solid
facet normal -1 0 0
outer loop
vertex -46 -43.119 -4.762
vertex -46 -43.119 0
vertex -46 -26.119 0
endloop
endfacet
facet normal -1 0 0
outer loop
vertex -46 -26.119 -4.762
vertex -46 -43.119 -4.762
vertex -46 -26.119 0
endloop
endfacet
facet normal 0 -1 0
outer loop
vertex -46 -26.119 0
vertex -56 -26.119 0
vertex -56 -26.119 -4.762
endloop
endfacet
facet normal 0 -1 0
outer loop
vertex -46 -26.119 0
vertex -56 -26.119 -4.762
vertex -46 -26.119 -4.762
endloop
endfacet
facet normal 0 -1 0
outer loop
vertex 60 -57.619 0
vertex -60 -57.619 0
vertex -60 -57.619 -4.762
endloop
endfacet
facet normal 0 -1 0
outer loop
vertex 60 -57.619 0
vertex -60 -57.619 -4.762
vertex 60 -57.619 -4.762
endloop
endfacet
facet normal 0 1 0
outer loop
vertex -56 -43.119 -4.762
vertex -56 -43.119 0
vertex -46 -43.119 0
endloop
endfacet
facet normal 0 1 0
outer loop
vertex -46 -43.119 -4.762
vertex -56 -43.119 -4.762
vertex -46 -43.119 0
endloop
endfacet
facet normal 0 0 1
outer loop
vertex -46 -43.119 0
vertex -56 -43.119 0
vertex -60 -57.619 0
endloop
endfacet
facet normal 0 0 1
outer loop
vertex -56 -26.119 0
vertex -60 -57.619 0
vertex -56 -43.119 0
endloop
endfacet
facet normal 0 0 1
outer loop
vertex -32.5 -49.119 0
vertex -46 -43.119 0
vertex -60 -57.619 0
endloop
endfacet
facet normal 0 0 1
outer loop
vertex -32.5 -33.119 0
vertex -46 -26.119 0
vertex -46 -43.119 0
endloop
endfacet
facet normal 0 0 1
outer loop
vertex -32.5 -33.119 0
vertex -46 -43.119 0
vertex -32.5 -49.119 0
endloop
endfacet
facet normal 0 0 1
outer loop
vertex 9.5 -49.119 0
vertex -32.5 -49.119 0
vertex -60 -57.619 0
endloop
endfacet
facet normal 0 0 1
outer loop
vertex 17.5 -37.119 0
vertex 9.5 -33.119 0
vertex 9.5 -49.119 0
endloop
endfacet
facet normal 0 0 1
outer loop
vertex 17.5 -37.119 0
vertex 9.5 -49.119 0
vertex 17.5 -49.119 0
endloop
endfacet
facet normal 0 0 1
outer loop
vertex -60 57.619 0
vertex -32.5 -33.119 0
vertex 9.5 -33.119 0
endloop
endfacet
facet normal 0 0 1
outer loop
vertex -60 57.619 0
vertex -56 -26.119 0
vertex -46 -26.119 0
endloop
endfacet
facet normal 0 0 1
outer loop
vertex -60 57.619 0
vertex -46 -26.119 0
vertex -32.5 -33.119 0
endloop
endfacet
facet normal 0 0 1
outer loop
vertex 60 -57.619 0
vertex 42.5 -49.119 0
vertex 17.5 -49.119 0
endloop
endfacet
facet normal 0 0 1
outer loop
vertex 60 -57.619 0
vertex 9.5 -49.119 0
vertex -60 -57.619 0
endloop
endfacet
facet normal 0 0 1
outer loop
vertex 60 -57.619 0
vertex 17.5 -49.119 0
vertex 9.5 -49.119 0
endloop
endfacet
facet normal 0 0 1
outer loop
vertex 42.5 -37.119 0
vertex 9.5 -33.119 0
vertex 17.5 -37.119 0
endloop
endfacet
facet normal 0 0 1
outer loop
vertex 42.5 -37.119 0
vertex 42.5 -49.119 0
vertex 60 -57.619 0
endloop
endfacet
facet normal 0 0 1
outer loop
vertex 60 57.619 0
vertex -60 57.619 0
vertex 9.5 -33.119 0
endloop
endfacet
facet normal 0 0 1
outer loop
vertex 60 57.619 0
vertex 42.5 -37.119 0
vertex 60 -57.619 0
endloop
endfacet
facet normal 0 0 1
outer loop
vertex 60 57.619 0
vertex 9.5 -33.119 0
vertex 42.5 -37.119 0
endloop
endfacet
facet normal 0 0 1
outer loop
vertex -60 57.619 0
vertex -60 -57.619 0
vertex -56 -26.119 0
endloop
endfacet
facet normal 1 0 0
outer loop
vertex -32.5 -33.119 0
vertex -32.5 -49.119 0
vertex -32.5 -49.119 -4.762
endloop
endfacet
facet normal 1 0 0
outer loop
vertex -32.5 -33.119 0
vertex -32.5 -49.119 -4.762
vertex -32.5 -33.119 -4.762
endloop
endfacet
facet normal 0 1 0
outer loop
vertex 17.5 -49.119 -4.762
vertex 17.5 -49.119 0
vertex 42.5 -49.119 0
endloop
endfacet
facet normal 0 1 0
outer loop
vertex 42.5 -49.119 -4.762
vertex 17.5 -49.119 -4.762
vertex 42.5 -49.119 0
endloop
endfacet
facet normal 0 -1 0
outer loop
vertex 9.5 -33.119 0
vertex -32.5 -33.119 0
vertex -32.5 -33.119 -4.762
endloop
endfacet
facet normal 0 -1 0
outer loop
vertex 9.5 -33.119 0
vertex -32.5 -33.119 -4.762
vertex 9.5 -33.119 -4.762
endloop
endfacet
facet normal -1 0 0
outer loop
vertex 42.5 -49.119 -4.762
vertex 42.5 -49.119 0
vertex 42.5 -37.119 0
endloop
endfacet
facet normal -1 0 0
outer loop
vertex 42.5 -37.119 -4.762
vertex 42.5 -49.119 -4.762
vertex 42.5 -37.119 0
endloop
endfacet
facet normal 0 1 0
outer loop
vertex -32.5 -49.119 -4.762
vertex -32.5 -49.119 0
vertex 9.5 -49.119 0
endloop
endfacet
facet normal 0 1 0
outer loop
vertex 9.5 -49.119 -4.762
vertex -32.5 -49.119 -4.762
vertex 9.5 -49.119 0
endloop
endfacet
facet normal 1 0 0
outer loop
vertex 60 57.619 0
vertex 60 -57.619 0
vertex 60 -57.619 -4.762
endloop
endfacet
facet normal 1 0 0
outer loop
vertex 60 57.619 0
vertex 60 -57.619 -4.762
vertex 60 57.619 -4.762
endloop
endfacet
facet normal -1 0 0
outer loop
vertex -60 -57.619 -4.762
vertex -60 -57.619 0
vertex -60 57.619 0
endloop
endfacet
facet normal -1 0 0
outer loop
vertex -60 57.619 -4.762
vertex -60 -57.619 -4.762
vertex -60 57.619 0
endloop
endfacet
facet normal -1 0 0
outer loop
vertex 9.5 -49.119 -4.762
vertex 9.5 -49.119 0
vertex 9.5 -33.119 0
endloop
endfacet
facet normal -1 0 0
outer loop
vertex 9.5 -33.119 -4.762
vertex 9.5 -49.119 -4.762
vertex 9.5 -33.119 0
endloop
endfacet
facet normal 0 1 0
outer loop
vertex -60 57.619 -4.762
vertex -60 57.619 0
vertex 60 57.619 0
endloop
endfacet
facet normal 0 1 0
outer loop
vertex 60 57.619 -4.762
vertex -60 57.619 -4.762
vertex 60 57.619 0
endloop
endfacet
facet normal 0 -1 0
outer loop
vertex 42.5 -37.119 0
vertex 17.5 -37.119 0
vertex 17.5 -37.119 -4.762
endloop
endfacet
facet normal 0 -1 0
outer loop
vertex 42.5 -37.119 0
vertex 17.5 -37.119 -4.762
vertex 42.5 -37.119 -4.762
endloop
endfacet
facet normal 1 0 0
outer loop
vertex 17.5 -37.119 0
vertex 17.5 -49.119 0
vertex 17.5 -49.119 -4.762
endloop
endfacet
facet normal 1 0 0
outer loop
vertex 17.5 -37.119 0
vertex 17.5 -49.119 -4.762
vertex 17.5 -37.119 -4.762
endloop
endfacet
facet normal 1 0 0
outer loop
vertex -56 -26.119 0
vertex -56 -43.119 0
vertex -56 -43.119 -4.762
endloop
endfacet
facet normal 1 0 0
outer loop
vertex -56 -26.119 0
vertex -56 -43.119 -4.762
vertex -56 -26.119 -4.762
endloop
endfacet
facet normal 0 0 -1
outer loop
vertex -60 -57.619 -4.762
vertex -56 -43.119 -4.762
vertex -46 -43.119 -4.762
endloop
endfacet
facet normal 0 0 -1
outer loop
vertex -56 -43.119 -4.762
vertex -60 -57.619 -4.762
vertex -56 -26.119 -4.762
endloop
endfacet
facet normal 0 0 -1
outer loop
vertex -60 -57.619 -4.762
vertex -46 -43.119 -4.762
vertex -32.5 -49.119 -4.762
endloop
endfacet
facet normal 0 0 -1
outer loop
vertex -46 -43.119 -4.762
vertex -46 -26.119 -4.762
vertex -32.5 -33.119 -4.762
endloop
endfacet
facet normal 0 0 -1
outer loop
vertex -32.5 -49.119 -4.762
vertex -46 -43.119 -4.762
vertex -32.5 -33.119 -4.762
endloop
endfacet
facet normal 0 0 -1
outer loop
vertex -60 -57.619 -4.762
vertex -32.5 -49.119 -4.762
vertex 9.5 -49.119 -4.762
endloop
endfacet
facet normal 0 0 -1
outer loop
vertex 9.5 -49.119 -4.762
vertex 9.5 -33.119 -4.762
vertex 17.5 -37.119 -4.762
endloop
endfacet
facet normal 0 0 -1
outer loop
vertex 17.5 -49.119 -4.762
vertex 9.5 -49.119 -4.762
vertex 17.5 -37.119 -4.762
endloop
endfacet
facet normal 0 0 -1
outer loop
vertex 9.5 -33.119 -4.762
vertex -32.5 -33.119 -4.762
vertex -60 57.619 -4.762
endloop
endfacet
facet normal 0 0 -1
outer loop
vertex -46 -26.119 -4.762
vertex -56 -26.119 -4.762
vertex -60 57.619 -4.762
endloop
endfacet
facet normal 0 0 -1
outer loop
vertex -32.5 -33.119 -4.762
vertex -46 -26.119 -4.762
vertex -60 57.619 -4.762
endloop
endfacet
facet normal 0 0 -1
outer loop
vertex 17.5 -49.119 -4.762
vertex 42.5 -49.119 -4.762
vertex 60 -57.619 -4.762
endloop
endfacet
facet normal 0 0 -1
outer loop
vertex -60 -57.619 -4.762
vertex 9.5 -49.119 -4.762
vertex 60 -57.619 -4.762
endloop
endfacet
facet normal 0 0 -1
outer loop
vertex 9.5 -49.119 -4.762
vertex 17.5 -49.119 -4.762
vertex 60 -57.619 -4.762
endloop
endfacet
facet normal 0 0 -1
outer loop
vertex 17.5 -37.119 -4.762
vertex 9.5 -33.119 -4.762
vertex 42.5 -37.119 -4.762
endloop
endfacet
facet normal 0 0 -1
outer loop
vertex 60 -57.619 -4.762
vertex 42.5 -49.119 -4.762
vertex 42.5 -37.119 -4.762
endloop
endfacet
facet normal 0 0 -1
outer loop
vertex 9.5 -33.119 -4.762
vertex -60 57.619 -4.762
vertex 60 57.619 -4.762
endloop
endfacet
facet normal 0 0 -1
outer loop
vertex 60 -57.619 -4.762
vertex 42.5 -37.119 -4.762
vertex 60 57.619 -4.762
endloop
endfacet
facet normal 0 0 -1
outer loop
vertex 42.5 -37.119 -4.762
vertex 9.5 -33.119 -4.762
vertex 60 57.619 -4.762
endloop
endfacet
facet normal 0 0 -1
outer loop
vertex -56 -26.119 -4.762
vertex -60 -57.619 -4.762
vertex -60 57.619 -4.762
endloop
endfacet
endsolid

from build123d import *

# Parameters (mm, degrees)
SKETCH1_W           = 120
SKETCH1_H           = 115.2375
BOSS_EXTRUDE1_DEPTH = 4.7625
SKETCH2_W           = 25
SKETCH2_H           = 12
SKETCH2_W_2         = 42
SKETCH2_H_2         = 16
SKETCH2_W_3         = 10
SKETCH2_H_3         = 17
CUT_EXTRUDE1_DEPTH  = 5.7625


with BuildPart() as part:
    # Sketch1 → Boss-Extrude1 (new body)
    with BuildSketch(Plane.XY):
        Rectangle(SKETCH1_W, SKETCH1_H)
    extrude(amount=-BOSS_EXTRUDE1_DEPTH)

    # Sketch2 → Cut-Extrude1 (cut, through all)
    with BuildSketch(Plane.XY):
        with Locations((30, -43.11875)):
            Rectangle(SKETCH2_W, SKETCH2_H)
        with Locations((-11.5, -41.11875)):
            Rectangle(SKETCH2_W_2, SKETCH2_H_2)
        with Locations((-51, -34.61875)):
            Rectangle(SKETCH2_W_3, SKETCH2_H_3)
    extrude(amount=-CUT_EXTRUDE1_DEPTH, mode=Mode.SUBTRACT)


solid = part.part
